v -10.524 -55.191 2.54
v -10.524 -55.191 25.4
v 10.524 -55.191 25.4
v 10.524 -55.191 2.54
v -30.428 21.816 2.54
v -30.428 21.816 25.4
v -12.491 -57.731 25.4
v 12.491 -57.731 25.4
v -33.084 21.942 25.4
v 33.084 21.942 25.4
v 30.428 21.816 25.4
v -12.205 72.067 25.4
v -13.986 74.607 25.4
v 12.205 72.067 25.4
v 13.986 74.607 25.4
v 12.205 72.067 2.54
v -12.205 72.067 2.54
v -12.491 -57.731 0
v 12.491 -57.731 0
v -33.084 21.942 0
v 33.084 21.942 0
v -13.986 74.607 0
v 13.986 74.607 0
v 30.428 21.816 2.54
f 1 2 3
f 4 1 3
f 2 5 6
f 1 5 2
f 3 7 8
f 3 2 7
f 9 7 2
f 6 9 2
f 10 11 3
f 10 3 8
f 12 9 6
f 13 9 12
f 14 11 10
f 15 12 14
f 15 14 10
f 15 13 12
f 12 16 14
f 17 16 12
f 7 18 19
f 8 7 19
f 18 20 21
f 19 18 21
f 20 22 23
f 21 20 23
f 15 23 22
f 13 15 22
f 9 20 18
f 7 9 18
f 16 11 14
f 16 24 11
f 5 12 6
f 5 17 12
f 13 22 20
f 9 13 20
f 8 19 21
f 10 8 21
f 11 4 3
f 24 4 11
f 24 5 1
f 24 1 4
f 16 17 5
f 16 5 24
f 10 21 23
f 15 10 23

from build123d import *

# Parameters (mm, degrees)
F1_DEPTH = 25.4
F2_T     = -2.54


# Not quite as in the source:
# - a feature of the source that left no trace in its solid (it failed there, or was rolled back) is left out


with BuildPart() as f1:
    # F0 (on Top) → F1 (new body)
    with BuildSketch(Plane.XY):
        Polygon((0, 74.6065601707), (0, -57.7306561172), (12.4910129234, -57.7306561172), (33.0843068659, 21.9417531043), (13.9860804434, 74.6065601707), align=None)
        Polygon((-12.4910129234, -57.7306561172), (0, -57.7306561172), (0, 74.6065601707), (-13.9860804434, 74.6065601707), (-33.0843068659, 21.9417531043), align=None)
    extrude(amount=F1_DEPTH)

    # F2
    f2_openings = [f1.faces().sort_by_distance(p)[0] for p in [
        (0, 11.07211, 25.4),
    ]]
    offset(amount=F2_T, openings=f2_openings)


solid = f1.part
